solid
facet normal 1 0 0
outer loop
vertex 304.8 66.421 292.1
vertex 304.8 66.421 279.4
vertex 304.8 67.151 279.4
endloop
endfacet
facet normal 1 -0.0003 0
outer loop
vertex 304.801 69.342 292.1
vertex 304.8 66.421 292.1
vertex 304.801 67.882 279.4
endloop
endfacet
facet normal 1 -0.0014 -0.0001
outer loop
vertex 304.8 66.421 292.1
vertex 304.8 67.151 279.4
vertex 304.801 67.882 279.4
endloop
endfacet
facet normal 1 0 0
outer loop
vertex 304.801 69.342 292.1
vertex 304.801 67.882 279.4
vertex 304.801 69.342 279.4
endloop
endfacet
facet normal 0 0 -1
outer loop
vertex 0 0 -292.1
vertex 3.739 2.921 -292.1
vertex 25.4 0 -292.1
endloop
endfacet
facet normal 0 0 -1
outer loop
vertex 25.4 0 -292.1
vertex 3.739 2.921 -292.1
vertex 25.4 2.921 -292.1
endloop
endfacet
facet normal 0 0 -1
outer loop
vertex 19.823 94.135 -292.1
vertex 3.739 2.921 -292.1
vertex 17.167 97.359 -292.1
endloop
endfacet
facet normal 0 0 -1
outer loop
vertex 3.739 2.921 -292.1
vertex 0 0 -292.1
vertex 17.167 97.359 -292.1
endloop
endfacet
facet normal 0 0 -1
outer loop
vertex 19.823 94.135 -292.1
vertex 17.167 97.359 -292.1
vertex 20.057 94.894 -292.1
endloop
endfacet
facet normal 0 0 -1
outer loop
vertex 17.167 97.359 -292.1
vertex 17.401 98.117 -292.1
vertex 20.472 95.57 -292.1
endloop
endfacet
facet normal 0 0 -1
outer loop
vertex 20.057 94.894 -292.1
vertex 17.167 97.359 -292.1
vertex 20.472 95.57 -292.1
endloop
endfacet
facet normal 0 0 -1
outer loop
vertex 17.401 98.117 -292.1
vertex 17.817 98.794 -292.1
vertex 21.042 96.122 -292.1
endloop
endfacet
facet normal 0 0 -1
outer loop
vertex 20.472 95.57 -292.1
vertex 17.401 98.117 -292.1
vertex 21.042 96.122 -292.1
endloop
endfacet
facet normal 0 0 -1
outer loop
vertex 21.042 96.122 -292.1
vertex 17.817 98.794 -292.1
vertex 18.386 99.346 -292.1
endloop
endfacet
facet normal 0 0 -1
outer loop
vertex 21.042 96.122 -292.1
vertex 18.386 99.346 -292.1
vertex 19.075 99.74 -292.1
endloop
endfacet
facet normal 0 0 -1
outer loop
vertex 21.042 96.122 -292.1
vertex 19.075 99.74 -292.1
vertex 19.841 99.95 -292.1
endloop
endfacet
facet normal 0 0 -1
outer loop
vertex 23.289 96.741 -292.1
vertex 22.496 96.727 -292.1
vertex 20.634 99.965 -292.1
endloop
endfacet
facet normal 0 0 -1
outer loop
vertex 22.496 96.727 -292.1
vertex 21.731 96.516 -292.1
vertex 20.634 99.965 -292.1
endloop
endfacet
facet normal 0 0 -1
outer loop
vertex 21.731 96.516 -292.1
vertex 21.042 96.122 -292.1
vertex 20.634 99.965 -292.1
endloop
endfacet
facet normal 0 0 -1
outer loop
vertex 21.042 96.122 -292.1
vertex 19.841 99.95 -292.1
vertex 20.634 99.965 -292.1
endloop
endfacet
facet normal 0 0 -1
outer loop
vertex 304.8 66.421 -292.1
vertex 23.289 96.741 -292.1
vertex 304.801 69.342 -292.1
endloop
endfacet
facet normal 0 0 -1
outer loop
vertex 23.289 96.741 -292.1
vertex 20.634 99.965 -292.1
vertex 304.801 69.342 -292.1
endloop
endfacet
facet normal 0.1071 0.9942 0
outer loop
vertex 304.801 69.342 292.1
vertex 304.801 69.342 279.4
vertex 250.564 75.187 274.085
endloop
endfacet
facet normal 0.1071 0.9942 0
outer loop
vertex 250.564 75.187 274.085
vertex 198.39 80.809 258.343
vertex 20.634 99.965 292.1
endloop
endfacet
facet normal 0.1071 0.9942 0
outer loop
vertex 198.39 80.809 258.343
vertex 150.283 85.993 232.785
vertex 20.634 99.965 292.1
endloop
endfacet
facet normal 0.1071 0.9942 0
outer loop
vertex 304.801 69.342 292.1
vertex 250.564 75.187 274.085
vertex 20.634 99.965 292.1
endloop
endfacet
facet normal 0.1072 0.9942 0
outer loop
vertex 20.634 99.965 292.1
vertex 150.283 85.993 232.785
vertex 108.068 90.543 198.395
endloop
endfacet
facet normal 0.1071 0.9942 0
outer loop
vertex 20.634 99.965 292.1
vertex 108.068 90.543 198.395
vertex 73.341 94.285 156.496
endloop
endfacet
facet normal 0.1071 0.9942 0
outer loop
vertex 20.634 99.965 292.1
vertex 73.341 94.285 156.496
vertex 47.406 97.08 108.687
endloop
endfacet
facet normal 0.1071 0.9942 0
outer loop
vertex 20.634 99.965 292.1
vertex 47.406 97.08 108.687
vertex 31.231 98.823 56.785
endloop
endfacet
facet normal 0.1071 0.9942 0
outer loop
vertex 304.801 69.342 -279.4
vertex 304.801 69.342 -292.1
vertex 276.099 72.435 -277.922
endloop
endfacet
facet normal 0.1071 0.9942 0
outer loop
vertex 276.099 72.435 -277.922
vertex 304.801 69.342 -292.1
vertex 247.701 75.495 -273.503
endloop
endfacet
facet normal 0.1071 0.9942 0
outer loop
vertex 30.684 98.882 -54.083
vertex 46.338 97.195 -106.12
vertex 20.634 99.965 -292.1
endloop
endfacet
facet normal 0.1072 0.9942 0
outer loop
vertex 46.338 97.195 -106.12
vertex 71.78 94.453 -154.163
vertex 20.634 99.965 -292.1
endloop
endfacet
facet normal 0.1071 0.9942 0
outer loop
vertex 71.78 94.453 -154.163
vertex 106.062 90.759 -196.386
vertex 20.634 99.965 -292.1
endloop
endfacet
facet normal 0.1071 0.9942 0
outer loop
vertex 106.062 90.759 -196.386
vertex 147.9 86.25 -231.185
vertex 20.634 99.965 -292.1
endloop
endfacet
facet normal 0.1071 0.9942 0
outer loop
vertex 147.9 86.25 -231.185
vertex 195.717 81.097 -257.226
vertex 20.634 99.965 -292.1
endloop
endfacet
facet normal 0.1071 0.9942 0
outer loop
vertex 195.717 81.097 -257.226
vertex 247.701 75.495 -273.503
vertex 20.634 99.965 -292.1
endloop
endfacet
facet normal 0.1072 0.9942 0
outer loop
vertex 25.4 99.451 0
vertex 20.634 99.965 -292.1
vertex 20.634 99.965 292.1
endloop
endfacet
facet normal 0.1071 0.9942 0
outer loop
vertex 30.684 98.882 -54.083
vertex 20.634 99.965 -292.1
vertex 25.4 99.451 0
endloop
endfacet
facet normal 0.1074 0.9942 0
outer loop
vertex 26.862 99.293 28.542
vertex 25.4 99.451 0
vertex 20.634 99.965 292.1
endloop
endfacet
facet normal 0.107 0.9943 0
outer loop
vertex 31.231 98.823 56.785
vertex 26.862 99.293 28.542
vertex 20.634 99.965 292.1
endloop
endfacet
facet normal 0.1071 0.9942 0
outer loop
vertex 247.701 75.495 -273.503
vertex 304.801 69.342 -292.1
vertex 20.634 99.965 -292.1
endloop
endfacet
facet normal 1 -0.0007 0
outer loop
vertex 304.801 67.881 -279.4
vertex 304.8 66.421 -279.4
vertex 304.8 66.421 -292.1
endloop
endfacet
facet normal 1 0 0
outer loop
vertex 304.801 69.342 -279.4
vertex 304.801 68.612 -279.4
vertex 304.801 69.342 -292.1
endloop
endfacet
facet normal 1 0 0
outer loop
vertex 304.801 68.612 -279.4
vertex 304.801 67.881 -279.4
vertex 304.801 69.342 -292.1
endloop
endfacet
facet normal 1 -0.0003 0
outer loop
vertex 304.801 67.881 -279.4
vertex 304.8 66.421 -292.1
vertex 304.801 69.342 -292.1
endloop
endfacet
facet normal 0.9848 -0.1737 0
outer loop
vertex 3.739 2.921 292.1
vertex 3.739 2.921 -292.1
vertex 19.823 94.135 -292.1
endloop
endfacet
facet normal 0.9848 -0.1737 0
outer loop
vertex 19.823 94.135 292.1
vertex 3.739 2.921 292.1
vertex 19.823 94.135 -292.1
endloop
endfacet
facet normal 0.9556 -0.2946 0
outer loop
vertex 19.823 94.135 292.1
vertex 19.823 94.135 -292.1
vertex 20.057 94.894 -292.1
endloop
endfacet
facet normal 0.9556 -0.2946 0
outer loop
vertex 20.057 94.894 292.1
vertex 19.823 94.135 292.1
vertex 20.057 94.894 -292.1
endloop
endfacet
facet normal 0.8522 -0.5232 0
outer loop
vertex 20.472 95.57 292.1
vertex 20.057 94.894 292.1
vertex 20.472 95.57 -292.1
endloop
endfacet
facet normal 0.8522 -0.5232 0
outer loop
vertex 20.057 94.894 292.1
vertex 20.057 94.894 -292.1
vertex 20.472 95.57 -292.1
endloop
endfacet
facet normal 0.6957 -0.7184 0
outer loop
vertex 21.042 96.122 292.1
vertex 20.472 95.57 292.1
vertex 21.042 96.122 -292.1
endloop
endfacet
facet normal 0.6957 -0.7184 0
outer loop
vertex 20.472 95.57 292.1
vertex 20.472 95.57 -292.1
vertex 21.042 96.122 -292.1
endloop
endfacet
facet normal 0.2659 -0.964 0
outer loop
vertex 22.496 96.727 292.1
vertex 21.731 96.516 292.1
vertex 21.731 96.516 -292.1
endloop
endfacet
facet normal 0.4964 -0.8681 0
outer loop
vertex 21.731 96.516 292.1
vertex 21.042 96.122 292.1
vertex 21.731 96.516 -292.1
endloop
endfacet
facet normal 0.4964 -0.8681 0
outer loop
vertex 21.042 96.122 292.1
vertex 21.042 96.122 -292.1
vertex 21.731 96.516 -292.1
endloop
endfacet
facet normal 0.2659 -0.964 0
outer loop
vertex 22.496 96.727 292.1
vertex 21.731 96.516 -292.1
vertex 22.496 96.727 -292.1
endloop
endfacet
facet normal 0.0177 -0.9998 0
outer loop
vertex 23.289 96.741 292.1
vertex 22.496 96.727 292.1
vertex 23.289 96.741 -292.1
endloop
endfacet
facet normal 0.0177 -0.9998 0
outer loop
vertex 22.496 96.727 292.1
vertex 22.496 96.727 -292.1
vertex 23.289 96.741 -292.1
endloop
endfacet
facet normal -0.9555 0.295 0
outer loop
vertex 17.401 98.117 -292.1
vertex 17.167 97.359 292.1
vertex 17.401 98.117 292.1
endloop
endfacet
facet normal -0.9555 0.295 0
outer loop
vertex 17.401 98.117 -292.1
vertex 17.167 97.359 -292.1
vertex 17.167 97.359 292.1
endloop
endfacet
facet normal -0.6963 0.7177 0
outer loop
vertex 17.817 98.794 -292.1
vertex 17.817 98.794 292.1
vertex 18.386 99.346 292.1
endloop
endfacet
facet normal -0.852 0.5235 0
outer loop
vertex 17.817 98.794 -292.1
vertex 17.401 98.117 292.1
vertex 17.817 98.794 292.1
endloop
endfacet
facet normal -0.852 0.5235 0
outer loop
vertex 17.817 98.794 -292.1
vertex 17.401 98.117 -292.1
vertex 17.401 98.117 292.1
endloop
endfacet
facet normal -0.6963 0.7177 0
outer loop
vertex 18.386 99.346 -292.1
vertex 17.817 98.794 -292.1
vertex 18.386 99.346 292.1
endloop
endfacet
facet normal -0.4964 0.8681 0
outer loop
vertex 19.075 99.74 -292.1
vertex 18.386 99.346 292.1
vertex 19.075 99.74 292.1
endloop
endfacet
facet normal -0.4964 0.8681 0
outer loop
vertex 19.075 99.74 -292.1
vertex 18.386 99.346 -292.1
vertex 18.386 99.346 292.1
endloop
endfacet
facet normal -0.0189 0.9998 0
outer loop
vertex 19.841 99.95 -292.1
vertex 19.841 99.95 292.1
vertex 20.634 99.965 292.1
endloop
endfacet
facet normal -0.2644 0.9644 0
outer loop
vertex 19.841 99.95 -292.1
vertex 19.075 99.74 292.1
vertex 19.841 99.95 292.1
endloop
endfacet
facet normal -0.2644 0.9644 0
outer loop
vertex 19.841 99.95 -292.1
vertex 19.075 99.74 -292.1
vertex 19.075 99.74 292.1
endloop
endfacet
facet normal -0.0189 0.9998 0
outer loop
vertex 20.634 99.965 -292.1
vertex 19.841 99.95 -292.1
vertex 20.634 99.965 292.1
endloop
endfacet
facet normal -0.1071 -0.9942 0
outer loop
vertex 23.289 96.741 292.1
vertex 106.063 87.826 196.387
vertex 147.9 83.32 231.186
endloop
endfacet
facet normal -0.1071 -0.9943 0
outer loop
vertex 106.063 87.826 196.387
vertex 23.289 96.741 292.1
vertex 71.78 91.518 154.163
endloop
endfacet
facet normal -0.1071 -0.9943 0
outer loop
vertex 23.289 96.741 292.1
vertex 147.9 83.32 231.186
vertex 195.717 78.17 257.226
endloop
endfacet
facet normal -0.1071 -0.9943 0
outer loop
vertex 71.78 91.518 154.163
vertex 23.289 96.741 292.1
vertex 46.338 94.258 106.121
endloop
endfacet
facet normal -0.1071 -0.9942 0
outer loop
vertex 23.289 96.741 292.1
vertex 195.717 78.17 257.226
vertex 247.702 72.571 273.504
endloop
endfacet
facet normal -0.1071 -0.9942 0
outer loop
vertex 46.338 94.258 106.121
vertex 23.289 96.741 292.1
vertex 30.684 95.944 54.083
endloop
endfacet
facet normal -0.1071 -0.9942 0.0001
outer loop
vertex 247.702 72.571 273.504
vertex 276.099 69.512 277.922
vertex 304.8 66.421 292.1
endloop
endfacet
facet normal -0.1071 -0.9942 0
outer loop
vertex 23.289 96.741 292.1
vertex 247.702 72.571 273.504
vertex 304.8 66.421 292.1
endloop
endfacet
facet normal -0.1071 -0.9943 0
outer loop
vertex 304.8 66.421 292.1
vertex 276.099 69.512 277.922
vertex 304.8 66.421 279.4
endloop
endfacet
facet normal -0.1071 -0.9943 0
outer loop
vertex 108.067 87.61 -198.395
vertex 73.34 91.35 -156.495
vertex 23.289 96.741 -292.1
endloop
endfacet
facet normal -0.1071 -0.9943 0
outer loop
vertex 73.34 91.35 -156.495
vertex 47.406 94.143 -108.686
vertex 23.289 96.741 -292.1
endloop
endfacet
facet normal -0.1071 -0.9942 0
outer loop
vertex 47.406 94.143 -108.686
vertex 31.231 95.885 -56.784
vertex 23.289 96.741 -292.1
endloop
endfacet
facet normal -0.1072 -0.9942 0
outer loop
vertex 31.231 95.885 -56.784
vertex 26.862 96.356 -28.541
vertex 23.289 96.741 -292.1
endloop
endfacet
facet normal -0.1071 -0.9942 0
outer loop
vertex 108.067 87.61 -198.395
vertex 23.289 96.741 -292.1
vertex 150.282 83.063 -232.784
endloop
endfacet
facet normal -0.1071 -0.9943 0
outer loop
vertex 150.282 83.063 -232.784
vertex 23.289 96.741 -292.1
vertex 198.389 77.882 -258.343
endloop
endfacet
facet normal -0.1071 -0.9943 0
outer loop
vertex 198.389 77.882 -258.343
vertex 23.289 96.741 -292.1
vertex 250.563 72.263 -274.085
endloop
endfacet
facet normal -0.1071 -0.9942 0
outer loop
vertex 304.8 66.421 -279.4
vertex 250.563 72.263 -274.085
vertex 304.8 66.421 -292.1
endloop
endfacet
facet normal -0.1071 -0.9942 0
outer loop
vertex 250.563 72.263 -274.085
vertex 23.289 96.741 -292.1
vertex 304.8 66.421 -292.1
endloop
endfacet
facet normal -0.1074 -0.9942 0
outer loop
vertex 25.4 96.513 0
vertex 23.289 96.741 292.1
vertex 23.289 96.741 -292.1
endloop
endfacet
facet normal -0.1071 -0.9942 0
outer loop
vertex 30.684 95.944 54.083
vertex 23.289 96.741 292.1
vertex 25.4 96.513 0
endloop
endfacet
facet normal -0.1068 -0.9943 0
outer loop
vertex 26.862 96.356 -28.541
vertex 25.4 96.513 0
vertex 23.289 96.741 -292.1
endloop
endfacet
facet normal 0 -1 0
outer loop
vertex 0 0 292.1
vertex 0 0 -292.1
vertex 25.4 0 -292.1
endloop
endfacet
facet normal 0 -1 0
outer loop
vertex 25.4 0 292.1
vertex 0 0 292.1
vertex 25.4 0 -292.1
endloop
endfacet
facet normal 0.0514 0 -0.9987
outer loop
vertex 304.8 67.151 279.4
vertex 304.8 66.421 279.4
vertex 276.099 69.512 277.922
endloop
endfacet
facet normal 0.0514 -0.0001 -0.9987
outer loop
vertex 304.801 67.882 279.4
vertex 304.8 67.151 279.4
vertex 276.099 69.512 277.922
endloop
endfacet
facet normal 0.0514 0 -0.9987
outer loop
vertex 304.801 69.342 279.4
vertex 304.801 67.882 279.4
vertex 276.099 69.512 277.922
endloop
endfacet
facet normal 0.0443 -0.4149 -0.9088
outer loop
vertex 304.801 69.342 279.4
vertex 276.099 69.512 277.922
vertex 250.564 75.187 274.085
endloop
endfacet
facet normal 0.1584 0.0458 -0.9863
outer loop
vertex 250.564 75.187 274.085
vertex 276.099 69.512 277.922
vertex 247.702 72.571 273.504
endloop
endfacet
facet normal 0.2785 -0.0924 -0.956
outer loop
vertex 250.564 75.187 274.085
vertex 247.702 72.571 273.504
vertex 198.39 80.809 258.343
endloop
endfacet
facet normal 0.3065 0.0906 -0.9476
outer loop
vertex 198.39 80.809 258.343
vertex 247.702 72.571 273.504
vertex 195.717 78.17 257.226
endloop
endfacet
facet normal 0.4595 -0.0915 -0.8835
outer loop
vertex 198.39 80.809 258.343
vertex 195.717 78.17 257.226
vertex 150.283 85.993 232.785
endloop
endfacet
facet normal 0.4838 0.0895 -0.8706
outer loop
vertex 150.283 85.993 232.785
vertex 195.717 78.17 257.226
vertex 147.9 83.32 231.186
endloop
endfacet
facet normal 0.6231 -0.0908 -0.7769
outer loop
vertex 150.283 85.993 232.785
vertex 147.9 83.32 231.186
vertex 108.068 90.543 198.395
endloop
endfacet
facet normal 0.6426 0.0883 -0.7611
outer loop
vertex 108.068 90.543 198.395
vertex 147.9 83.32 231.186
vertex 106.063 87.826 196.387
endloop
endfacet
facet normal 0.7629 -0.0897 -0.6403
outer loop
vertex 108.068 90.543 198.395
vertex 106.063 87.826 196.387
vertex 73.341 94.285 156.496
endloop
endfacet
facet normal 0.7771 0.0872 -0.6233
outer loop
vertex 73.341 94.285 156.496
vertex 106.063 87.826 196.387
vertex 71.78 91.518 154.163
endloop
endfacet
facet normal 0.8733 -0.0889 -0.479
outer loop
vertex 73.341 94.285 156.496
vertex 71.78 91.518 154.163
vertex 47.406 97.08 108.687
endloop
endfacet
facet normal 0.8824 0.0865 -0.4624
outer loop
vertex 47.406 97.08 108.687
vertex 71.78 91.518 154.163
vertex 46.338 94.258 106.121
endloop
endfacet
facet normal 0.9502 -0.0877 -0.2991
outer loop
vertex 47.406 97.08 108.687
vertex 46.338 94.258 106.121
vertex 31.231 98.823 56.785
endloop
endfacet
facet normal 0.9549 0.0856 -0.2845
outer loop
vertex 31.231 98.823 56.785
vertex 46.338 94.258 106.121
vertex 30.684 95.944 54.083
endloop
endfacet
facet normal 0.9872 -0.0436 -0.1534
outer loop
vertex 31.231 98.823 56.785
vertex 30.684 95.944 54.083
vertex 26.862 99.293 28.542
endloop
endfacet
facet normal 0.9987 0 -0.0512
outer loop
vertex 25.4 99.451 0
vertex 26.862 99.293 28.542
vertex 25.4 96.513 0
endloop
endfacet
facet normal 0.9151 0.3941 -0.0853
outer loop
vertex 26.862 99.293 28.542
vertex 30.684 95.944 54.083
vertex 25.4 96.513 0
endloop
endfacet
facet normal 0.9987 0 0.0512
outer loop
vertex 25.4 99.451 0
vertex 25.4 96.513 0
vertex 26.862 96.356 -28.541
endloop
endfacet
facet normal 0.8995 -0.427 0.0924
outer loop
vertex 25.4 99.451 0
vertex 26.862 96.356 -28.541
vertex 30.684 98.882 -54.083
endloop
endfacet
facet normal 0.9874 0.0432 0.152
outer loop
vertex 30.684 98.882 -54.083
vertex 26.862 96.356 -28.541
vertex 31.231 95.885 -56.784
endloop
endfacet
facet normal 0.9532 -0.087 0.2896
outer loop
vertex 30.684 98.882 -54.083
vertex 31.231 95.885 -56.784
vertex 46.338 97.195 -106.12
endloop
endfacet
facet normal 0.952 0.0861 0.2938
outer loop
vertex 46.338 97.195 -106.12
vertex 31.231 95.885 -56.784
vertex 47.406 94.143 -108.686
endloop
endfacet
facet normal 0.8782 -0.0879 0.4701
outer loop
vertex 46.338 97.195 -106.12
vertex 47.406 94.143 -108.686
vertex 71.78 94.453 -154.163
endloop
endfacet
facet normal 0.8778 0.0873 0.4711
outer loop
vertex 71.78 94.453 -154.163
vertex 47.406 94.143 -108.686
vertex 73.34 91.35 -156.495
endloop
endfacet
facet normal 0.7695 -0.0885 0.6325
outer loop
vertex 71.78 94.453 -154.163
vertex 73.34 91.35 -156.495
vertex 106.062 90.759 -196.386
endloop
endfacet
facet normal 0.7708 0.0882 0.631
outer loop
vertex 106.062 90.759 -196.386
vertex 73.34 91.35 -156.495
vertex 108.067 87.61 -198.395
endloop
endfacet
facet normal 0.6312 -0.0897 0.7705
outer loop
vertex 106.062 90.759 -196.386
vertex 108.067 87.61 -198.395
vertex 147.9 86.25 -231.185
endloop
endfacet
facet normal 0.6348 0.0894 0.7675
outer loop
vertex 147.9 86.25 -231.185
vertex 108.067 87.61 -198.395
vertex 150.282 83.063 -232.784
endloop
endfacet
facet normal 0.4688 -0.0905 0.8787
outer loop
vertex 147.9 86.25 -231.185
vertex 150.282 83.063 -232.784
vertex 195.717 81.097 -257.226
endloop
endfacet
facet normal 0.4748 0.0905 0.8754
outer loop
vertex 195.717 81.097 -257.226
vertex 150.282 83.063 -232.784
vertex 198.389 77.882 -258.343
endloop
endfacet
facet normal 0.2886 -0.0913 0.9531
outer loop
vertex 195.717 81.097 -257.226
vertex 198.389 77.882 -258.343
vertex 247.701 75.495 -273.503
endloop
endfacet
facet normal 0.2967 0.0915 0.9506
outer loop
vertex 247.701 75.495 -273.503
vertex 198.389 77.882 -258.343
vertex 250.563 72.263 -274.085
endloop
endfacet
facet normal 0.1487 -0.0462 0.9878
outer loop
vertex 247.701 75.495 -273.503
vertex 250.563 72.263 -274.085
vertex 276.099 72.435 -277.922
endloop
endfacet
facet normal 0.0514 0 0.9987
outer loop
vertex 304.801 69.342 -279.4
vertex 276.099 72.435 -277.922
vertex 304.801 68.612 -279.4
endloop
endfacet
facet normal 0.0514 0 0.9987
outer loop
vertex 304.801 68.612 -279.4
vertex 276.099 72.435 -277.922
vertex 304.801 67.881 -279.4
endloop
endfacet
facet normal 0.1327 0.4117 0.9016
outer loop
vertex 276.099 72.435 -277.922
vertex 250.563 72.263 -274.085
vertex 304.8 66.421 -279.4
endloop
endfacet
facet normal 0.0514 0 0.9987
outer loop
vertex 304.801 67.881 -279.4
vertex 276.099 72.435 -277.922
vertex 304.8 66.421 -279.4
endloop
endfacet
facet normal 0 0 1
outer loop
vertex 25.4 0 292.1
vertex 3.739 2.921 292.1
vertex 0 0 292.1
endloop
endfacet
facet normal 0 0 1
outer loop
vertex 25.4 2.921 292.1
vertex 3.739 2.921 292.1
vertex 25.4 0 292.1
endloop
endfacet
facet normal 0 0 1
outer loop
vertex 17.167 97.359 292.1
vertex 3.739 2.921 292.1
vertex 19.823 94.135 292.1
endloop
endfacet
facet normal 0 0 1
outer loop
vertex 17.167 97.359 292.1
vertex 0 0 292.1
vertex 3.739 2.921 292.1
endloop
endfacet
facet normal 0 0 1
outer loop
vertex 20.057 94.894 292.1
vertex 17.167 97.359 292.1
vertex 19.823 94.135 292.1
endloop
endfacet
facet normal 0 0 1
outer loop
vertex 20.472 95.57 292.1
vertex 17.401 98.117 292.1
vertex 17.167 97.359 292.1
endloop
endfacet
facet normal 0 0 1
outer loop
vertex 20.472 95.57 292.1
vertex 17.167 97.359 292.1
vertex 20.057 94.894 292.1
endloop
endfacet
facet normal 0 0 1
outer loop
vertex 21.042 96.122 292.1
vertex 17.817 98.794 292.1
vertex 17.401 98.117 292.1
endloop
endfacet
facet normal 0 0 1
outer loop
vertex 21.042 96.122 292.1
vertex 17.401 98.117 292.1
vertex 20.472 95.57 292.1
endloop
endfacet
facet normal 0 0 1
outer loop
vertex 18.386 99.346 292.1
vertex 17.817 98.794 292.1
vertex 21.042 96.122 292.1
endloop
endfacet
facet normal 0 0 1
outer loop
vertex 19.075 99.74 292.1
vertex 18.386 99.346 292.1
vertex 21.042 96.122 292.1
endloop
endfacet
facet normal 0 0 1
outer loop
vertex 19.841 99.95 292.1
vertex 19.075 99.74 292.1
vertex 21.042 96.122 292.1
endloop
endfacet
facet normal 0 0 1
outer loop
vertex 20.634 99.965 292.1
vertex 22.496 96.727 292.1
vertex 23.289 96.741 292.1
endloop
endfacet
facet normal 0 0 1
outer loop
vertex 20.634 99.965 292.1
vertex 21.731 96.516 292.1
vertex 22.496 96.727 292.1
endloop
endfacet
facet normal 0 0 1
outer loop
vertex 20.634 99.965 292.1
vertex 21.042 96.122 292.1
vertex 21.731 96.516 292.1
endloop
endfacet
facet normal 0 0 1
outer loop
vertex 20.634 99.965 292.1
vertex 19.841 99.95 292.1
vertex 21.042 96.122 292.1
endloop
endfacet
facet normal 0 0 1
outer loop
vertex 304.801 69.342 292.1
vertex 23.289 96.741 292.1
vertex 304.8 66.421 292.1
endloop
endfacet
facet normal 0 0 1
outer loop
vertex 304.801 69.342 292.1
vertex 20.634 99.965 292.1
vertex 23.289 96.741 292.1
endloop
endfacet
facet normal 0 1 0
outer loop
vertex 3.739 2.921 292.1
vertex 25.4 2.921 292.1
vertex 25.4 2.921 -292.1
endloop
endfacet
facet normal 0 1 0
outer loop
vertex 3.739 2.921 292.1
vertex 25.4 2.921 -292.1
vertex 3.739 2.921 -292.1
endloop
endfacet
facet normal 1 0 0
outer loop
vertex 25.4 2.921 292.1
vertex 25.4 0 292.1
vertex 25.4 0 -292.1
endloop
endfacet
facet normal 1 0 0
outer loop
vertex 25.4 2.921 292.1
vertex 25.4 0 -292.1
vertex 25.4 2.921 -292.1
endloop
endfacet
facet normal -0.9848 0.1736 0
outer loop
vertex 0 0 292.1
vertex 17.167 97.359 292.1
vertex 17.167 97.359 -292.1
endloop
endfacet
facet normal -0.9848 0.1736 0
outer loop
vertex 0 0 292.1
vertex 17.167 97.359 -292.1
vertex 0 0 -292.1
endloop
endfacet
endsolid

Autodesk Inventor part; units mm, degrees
ref_plane "YZ Plane" through (0, 0, 0) normal (1, 0, 0) x (0, 1, 0)
ref_plane "XZ Plane" through (0, 0, 0) normal (0, 1, 0) x (-1, 0, 0)
ref_plane "XY Plane" through (0, 0, 0) normal (0, 0, 1) x (1, 0, 0)
sketch "Sketch1" plane through (0, 0, 0) normal (0, 0, 1) x (1, 0, 0)
  line L0 (3.739, 2.921) -> (19.8226, 94.1354)
  line L1 (304.8, 66.421) -> (304.8011, 69.342)
  line L2 (304.8011, 69.342) -> (20.634, 99.9646)
  line L3 (17.1671, 97.3593) -> (0, 0)
  line L4 (0, 0) -> (25.4, 0)
  line L5 (25.4, 0) -> (25.4, 2.921)
  line L6 (25.4, 2.921) -> (3.739, 2.921)
  line L7 (23.2893, 96.7408) -> (304.8, 66.421)
  arc A0 (20.634, 99.9646) -> (17.1671, 97.3593) centre (20.2938, 96.8079) ccw
  arc A1 (23.2893, 96.7408) -> (19.8226, 94.1354) centre (22.9493, 93.584) ccw
  point P0 (20.338, 97.0586)
  point P1 (17.6825, 100.2827)
  dimension "d4" = 101.6
  dimension "d12" = 3.175
  dimension "d13" = 25.4
  dimension "d14" = 2.921
  dimension "d15" = 304.8
  dimension "d17" = 80
  dimension "d19" = 2.921
  dimension "d21" = 63.5
  dimension "d24" = 2.921
  dimension "d25" = 93.849
  dimension "d26" = 3.175
extrude "Extrusion1" add sketch "Sketch1" along normal mid plane 584.2
sketch "Sketch2" plane through (0, 0, 0) normal (0, 1, 0) x (-1, 0, 0)
  circle A0 centre (-304.8, 0) radius 279.4
  line L0 (0, -292.1) -> (0, 292.1) projected
  point P0 (0, 0)
  point P1 (0, 0)
  dimension "d8" = 558.8
  dimension "d9" = 304.8
extrude "Extrusion2" cut sketch "Sketch2" along normal through all
properties part number "CarouselRamp" material "Polycarbonate, Smoke"
